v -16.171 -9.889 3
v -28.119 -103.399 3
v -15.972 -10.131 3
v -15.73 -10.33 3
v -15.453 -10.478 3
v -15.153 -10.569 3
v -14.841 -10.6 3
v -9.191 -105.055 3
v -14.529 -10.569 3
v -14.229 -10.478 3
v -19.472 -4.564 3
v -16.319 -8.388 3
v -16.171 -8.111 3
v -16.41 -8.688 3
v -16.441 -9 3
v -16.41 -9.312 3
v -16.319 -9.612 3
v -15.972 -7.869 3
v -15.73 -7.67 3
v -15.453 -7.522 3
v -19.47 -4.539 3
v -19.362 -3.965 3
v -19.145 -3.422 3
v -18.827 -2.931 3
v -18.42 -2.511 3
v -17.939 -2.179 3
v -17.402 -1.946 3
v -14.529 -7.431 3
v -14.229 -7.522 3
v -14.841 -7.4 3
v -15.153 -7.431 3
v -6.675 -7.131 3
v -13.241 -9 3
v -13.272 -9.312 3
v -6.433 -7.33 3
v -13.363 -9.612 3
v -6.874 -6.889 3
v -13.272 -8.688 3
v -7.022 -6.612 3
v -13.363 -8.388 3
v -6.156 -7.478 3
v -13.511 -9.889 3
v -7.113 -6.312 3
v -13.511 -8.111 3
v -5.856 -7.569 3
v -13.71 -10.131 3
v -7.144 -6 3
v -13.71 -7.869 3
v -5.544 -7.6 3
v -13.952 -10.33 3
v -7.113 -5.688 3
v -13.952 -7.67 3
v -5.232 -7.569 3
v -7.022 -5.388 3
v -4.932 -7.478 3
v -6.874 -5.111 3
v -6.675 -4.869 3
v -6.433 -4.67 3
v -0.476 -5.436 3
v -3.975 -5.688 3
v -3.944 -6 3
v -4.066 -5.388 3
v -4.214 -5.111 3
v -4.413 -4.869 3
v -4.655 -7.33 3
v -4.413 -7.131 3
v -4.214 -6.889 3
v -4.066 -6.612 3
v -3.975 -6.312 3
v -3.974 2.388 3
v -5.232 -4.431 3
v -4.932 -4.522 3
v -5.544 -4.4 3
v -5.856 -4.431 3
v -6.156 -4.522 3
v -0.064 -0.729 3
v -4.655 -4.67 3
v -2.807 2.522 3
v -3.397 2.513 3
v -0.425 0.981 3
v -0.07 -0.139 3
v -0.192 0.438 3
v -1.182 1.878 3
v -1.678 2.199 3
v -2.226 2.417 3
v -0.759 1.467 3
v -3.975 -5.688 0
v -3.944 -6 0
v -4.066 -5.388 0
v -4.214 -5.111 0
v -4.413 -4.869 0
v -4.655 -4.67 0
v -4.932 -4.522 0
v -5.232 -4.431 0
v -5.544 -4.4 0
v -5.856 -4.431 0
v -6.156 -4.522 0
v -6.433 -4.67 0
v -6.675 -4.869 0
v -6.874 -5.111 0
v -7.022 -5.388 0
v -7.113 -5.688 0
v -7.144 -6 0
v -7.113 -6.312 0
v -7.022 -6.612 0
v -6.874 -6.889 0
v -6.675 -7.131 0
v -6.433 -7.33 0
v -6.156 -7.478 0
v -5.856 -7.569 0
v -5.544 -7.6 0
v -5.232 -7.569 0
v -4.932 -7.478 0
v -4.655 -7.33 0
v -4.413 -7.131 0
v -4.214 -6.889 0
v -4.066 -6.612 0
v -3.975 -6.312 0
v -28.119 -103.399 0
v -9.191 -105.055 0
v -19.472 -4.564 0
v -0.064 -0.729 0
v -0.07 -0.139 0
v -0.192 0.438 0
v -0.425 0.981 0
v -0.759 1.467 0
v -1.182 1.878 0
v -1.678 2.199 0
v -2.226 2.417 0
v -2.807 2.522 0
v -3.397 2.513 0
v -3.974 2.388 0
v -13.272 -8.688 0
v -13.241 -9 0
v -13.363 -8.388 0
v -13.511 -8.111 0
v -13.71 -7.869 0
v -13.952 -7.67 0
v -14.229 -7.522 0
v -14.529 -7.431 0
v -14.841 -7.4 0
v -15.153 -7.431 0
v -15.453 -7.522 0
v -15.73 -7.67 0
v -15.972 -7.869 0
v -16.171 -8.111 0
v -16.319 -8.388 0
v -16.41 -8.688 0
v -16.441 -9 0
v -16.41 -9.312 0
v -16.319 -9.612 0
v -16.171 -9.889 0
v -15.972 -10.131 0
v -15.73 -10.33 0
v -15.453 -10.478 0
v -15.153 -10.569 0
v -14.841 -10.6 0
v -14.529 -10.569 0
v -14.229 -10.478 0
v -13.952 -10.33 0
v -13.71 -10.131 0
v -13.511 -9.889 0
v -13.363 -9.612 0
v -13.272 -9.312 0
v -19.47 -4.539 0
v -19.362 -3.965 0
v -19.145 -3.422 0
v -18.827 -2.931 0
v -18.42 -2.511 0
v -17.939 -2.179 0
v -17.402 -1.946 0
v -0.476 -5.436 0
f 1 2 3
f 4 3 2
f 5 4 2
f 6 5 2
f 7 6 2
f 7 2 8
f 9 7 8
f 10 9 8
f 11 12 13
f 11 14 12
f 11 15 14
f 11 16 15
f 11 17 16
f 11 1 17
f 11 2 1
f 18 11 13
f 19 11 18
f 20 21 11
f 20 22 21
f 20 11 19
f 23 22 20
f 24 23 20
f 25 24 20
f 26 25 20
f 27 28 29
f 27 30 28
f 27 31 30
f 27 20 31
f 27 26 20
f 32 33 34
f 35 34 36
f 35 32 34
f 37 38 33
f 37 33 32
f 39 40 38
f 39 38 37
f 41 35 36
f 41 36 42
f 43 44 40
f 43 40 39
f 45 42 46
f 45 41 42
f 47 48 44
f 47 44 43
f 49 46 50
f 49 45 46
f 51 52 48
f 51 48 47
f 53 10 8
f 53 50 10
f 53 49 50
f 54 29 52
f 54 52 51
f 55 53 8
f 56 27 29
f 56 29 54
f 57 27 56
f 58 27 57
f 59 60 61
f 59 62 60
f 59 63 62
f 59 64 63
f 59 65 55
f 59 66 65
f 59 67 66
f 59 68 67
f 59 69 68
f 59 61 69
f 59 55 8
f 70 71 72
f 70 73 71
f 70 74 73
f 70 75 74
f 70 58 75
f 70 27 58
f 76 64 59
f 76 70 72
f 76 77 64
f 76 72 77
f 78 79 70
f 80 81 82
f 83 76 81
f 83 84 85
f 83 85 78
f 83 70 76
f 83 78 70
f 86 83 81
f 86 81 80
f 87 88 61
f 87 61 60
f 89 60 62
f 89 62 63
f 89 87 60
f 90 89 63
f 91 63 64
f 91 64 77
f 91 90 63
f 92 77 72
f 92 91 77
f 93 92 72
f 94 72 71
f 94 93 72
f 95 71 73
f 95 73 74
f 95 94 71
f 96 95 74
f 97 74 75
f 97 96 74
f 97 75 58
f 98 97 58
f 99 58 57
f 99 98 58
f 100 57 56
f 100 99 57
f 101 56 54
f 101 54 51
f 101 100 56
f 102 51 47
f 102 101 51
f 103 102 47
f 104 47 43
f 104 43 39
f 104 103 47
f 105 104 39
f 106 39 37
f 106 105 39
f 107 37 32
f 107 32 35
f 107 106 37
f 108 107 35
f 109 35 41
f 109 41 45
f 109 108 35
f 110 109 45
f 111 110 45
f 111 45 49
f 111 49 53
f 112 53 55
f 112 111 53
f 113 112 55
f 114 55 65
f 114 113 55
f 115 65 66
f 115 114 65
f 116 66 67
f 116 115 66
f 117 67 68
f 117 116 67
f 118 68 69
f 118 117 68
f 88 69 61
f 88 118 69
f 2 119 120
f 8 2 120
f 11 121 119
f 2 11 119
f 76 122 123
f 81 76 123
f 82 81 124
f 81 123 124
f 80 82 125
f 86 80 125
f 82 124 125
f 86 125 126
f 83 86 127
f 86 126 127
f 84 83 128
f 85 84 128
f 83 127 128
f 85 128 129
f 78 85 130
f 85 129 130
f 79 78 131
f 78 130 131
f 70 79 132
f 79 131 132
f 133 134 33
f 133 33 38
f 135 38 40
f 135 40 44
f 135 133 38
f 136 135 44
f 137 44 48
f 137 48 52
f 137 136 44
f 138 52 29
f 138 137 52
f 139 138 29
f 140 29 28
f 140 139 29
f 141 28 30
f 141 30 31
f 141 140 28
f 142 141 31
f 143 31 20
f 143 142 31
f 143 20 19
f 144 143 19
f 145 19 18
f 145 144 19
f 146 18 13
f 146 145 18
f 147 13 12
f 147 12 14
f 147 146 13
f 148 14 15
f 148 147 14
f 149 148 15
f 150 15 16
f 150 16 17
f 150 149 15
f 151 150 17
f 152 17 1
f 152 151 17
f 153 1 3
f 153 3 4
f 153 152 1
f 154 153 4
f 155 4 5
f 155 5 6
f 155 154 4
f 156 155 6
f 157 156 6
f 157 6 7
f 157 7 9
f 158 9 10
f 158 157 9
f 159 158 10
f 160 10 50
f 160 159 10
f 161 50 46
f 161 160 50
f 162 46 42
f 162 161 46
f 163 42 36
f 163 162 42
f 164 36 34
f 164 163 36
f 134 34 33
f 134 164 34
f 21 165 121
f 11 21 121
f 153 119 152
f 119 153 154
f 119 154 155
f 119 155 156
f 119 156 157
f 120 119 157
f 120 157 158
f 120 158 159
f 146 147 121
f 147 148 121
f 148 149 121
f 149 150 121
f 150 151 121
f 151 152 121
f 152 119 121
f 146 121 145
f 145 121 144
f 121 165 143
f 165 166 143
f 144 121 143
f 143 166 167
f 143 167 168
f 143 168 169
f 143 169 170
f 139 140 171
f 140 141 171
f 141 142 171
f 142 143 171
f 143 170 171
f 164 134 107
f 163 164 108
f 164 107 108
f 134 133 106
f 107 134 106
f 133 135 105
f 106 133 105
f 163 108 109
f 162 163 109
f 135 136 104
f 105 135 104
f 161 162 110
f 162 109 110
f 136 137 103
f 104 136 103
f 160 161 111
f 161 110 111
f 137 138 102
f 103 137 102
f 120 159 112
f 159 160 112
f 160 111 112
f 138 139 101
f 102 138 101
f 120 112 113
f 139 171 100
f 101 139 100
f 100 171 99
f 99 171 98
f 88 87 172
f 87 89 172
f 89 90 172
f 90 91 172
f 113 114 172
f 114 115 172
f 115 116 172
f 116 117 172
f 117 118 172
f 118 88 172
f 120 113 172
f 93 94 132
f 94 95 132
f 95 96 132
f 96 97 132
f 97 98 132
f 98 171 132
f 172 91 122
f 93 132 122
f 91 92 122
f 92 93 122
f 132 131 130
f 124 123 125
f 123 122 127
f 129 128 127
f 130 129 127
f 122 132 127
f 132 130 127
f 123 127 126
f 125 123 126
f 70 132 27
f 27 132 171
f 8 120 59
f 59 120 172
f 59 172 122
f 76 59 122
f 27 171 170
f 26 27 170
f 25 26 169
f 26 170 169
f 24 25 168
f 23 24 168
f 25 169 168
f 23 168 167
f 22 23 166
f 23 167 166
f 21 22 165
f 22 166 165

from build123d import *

# Parameters (mm, degrees)
F0_R     = 1.6
F1_DEPTH = 3


with BuildPart() as f1:
    # F0 (on Top) → F1 (new body)
    with BuildSketch(Plane.XY):
        with BuildLine():
            Line((-19.4697175733, -4.5393385149), (-19.4718945337, -4.5642212863))
            Line((-19.4718945337, -4.5642212863), (-28.1188425534, -103.3992894107))
            Line((-28.1188425534, -103.3992894107), (-9.1911432897, -105.0552485229))
            Line((-9.1911432897, -105.0552485229), (-0.4755690149, -5.4357787137))
            Line((-0.4755690149, -5.4357787137), (-0.0637739547, -0.7289396381))
            ThreePointArc((-0.0637739547, -0.7289396381), (-1.1824461608, 1.8784665345), (-3.9736495146, 2.3875620971))
            Line((-3.9736495146, 2.3875620971), (-17.4024249446, -1.9457712363))
            ThreePointArc((-17.4024249446, -1.9457712363), (-18.8270724233, -2.930893855), (-19.4697175733, -4.5393385149))
        make_face()
        with Locations((-14.8408756973, -9)):
            Circle(F0_R, mode=Mode.SUBTRACT)
        with Locations((-5.5440311689, -6)):
            Circle(F0_R, mode=Mode.SUBTRACT)
    extrude(amount=F1_DEPTH)


solid = f1.part
